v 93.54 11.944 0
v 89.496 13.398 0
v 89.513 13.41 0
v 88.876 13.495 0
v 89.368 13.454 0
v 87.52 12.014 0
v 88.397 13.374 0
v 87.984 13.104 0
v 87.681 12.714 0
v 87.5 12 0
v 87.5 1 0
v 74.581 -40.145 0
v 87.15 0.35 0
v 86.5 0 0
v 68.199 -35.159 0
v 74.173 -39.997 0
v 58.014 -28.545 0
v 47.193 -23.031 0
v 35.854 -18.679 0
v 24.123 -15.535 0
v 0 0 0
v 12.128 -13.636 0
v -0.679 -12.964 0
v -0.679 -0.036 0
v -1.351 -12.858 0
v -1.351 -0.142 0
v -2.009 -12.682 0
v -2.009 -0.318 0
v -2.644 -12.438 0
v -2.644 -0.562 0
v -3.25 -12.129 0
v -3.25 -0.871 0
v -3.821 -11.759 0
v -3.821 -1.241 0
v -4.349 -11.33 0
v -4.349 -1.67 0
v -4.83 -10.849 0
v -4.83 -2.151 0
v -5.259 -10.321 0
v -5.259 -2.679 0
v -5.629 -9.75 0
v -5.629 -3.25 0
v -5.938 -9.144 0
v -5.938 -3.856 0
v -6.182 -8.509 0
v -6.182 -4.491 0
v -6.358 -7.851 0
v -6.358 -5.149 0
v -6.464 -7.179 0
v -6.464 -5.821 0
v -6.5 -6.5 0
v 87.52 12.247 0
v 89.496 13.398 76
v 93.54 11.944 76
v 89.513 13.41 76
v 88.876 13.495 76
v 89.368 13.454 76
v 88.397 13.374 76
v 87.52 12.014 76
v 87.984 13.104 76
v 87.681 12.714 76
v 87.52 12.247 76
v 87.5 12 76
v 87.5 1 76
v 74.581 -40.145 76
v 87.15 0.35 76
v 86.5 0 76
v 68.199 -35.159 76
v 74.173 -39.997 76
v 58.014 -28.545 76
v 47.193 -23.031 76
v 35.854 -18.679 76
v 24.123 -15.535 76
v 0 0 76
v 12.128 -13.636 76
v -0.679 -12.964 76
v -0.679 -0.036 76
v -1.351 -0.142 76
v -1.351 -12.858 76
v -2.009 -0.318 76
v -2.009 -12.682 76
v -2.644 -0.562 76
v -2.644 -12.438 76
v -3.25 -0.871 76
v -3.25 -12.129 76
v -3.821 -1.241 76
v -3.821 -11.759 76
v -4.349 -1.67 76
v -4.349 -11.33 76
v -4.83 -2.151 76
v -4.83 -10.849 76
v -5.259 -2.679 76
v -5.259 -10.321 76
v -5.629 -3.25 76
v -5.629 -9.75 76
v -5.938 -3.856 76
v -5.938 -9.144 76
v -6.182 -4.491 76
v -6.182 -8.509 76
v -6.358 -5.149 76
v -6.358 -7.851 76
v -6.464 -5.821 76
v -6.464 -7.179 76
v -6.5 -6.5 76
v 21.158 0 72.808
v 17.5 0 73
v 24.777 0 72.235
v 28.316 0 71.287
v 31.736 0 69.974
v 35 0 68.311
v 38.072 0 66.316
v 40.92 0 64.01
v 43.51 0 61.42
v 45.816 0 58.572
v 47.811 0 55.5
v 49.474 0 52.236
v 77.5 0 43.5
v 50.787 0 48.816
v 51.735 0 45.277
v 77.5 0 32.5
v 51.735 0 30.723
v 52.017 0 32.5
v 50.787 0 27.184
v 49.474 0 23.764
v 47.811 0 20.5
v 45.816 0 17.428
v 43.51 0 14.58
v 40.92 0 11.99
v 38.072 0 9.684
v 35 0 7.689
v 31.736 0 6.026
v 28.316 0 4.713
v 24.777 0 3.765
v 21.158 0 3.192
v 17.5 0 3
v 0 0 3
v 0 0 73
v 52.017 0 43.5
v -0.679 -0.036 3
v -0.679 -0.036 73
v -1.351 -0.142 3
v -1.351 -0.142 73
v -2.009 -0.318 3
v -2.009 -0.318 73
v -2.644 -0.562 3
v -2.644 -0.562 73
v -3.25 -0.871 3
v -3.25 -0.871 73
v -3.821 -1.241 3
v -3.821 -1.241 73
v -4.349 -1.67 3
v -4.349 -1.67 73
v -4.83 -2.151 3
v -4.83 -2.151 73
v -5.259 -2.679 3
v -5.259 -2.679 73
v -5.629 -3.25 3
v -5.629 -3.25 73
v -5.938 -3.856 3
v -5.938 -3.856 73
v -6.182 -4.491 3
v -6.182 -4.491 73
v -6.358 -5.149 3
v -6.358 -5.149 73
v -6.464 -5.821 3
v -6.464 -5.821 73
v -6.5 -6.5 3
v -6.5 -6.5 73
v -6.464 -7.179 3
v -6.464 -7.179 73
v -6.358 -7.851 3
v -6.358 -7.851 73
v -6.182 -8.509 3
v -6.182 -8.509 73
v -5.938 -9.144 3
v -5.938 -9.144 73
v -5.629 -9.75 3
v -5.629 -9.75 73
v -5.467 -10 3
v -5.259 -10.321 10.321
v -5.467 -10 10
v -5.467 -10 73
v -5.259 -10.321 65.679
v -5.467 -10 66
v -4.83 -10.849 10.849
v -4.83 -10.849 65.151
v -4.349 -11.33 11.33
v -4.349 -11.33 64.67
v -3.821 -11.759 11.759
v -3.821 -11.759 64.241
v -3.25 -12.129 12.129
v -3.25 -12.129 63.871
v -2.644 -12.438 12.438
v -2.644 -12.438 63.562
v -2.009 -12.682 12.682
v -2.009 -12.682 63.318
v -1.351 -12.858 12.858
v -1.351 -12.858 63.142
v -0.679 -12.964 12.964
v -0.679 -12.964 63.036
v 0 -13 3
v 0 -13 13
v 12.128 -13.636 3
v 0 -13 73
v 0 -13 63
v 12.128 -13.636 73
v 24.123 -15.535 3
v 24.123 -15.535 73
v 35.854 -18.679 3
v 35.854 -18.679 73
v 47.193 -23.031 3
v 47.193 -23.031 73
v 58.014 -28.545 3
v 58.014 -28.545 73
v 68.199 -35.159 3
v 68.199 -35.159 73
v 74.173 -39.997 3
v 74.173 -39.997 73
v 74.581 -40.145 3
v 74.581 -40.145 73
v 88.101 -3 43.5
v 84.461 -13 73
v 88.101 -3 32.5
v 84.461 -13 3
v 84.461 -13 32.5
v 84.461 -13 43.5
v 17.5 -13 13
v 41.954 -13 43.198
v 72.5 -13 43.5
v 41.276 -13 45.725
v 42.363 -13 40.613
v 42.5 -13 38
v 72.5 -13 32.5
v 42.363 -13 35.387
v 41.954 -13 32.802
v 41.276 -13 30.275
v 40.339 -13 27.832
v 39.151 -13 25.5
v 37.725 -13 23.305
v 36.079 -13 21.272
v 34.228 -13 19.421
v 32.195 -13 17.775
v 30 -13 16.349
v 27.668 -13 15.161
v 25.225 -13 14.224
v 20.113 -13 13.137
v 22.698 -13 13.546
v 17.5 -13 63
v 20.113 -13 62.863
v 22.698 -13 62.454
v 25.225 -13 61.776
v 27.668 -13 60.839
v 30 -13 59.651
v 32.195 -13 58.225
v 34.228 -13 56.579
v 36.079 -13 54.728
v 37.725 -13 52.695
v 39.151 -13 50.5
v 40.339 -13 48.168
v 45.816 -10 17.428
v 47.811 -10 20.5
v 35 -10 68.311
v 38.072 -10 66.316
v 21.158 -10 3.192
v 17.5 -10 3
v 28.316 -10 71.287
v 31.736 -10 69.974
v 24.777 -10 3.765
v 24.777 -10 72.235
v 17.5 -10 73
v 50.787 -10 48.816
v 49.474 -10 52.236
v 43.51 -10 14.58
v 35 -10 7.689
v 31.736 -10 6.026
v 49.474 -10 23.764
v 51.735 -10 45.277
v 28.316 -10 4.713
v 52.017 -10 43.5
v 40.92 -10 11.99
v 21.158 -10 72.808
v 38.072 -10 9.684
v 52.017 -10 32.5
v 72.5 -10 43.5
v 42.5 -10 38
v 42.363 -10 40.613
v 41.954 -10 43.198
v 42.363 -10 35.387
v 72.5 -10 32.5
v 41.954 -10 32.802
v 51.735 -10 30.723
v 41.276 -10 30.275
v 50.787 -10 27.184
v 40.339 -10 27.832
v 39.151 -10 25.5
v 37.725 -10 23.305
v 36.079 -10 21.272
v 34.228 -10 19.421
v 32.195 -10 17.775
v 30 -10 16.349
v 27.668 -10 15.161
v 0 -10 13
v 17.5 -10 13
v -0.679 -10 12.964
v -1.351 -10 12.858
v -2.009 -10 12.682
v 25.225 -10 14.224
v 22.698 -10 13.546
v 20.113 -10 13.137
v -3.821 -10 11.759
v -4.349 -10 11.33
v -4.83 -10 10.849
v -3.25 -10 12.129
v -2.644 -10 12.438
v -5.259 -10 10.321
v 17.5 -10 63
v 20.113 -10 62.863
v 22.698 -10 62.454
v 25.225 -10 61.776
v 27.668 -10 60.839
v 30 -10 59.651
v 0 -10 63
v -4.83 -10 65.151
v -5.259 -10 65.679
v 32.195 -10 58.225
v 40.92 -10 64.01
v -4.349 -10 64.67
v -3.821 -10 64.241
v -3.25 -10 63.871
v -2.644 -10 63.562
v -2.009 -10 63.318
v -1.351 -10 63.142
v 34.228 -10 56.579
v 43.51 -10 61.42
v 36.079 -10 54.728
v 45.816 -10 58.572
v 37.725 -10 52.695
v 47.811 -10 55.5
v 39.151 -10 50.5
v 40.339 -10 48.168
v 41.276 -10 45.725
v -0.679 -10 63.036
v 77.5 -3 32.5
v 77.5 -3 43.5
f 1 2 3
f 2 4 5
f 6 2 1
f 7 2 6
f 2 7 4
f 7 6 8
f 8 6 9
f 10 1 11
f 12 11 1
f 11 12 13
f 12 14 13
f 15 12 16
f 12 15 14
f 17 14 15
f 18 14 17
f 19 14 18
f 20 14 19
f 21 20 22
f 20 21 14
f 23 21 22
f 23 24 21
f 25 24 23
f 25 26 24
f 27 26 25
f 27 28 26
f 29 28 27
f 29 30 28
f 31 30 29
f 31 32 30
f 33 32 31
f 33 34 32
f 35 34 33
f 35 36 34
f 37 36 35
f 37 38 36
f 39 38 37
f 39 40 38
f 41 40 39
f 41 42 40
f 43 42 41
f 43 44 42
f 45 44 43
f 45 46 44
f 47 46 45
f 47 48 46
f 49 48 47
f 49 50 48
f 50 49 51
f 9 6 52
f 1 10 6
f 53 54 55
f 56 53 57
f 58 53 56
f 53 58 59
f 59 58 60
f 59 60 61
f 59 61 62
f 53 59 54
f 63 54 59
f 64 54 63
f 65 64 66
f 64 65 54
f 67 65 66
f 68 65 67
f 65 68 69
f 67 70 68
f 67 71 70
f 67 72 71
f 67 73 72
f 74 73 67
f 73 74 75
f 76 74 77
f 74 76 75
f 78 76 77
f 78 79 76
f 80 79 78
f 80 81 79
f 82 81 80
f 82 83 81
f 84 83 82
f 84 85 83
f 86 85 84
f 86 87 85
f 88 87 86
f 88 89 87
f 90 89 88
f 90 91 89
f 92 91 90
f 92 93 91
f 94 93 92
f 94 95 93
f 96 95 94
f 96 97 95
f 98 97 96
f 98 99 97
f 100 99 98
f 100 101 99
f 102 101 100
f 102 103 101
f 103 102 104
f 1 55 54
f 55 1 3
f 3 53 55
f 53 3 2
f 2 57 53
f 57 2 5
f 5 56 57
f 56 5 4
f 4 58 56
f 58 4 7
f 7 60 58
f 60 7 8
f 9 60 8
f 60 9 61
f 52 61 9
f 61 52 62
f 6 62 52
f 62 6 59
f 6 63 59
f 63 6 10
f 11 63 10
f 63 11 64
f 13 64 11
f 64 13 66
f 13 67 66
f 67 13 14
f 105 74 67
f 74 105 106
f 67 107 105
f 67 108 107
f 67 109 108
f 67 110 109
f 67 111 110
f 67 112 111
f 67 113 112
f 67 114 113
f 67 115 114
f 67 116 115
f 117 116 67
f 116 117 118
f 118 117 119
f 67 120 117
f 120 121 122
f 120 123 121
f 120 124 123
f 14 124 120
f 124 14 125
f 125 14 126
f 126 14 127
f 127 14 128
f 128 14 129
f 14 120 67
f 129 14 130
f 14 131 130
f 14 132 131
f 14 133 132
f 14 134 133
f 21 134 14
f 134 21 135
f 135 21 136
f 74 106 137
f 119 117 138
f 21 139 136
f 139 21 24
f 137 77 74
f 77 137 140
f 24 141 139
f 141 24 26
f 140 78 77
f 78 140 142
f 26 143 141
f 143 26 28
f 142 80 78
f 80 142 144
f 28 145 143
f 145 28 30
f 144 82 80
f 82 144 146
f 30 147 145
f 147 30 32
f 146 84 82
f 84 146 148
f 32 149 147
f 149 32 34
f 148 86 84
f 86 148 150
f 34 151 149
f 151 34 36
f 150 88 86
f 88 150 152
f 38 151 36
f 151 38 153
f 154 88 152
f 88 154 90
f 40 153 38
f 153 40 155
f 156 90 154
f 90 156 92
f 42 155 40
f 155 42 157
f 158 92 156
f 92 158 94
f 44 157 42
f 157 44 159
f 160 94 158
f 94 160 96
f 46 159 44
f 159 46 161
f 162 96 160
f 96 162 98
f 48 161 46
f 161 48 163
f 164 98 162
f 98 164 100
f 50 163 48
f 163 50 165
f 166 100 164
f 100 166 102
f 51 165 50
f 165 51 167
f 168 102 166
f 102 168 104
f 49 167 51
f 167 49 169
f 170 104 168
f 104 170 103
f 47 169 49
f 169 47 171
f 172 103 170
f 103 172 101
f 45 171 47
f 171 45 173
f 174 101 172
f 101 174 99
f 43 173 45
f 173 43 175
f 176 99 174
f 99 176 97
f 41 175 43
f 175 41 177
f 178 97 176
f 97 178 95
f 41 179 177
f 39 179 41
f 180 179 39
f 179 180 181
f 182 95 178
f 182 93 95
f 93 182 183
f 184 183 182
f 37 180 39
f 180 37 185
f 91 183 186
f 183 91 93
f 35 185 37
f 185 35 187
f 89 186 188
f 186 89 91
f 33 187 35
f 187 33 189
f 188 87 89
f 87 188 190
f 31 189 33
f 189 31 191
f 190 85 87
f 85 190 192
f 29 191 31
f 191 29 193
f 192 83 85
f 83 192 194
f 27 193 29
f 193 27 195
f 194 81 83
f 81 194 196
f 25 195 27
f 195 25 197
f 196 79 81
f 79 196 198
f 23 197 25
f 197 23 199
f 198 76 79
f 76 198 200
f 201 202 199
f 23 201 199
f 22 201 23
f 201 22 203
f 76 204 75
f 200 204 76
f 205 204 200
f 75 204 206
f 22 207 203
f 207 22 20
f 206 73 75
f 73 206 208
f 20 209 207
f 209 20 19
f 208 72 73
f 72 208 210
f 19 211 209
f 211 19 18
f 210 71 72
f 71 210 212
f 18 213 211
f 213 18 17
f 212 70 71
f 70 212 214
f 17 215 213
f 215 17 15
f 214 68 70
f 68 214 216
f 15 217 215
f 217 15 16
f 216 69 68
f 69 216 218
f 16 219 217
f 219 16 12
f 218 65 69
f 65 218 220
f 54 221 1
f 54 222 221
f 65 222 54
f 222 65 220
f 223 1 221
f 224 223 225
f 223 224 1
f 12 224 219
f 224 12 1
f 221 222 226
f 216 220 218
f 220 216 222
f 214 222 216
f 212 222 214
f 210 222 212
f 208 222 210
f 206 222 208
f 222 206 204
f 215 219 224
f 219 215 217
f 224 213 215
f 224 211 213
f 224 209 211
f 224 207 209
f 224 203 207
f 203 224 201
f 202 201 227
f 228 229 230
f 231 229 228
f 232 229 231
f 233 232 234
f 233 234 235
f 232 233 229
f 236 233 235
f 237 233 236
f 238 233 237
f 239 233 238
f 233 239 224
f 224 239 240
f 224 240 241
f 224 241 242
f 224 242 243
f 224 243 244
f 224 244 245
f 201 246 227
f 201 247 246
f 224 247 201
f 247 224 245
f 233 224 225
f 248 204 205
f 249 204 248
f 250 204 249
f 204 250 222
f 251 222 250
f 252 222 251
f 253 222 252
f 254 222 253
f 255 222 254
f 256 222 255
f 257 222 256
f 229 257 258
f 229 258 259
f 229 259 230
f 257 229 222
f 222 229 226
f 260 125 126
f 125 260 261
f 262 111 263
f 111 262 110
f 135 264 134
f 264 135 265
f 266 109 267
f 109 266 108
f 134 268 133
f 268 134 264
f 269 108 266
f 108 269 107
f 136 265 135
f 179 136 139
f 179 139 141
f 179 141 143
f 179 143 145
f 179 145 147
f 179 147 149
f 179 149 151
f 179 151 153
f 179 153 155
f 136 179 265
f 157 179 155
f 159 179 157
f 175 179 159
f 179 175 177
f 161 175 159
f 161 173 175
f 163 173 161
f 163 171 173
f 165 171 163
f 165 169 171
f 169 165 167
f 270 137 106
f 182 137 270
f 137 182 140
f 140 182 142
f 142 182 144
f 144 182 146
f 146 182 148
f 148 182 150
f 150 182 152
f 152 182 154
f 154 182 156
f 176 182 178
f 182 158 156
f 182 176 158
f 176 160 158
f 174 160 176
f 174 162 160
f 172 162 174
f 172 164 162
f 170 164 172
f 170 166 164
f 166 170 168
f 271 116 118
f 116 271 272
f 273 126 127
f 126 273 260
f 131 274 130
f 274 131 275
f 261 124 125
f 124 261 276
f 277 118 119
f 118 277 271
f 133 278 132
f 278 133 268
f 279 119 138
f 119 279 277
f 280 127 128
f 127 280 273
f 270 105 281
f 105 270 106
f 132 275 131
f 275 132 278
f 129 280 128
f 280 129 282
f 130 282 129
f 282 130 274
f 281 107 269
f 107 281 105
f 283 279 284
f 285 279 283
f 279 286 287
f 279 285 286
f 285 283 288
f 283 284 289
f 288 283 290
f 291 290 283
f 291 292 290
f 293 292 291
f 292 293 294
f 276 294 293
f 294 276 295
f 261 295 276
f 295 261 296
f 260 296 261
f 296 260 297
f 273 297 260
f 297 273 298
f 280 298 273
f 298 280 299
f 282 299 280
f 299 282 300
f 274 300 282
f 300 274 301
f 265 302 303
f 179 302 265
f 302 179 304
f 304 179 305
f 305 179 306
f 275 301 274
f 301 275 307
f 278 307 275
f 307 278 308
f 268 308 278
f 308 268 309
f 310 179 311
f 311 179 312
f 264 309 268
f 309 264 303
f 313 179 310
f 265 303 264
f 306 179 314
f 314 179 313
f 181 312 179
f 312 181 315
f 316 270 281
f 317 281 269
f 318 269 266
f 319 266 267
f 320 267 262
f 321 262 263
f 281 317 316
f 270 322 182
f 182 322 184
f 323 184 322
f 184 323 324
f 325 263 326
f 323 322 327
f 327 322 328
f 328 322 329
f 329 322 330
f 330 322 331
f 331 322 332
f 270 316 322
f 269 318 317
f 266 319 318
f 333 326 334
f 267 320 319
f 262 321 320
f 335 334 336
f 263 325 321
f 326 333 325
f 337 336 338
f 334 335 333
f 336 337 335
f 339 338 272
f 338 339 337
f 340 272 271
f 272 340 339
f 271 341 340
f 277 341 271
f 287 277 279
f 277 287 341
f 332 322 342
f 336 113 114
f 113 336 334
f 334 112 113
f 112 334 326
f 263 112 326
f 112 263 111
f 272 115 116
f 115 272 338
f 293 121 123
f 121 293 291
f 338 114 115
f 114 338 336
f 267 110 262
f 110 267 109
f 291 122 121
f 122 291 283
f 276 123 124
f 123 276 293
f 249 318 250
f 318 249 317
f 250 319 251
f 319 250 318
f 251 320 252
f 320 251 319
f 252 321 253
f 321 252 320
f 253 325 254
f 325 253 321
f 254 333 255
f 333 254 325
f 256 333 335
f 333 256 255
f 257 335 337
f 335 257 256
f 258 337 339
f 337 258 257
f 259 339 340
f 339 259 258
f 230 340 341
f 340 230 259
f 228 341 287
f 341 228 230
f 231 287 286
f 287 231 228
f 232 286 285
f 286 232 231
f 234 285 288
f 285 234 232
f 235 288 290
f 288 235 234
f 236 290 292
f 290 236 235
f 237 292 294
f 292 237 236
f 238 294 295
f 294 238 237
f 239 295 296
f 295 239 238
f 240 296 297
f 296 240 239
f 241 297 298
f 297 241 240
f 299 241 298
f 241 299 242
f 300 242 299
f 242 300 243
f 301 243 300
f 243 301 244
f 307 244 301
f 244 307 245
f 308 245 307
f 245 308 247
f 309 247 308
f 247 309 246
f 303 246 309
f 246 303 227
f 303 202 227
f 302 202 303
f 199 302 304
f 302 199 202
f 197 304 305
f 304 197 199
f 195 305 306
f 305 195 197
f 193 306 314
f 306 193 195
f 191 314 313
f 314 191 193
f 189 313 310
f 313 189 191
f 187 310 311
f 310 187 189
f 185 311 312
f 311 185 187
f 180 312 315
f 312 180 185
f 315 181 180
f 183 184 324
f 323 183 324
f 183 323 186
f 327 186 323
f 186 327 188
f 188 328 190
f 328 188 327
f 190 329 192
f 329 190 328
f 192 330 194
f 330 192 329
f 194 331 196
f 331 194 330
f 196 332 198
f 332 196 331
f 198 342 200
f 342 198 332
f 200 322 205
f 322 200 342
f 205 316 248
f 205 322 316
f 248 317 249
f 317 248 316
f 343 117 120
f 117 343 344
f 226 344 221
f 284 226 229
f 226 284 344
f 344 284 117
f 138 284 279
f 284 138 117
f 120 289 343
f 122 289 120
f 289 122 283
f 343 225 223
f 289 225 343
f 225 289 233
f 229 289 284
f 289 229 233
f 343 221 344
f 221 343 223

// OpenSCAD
// Diameter of your wireless charger
QiDiameter = 70;
// Thickness of your wireless charger
QiThickness = 10;
// Width of the USB connector that you're using with the wireless charger. I would recommend giving an extra 1mm buffer over what you measured.
USBWidth = 11;
// We'll need this to position the wireless charger at the center of your phone.
PhoneHeight = 140;
// This determines the size of the base where the phone rest on. The default should be fine for most naked phones, but you may want to use a larger value if you have a thick casing.
PhoneThickness = 12;
// The default should be fine, but you can use a different value to have a thicker or thinner wall.
WallThickness = 3;
// The angle (in degrees) that the holder is tilted at.
Tilt = 70;

/* [Hidden] */
$fa = 6;
$fs = 0.5;


// Side Profile in 2D
module Side_Profile() {
 p2x = 0.25*QiDiameter + 0.5*PhoneHeight;
 p4x = p2x + WallThickness;
 p3x = p2x+1.5*cos(Tilt)+1.5;
 p3y = PhoneThickness+1.5*sin(Tilt);
 temp1 = (PhoneThickness-3*tan(Tilt))*cos(Tilt)+3;
 p5x = p3x + temp1*sin(Tilt);
 p5y = p3y - temp1*cos(Tilt);
 temp2 = sin(Tilt) * (p5x - (p5y + QiThickness + WallThickness) / tan(Tilt));
 p6x = temp2*sin(Tilt);
 p6y = -temp2*cos(Tilt) - QiThickness - WallThickness;
    
 difference() {
  union() {
   polygon([[0,0],
            [p2x - 1, 0],
            [p2x - 0.35, 0.35],  // Simple fillet
            [p2x, 1],
            [p2x, PhoneThickness], 
            [p3x, p3y],
            [p5x, p5y],
            [p6x, p6y],
            [0,-QiThickness - WallThickness]
           ]);
   translate([0,-0.5*(QiThickness+WallThickness),0]) circle(d=QiThickness+WallThickness);
   translate([p2x+1.5,PhoneThickness,0]) circle(d=3);
  }
  temp3 = 0.5 * temp2 / cos(Tilt);
  translate([0,-QiThickness - WallThickness - temp3,0]) circle(r=temp3);
 }
}

// Extruded and excess removed
module Extruded() {
 difference() {
  linear_extrude(height = QiDiameter + 2*WallThickness) Side_Profile();
  translate ([-100,-400-QiThickness-WallThickness,WallThickness]) resize([400,400,0]) cube(QiDiameter);
 }
}

// Qi Hole cut
module Qi_Hole() {
 difference() {
  Extruded();
  translate([0,-QiThickness,QiDiameter+WallThickness])
   rotate([-90,0,0])
    linear_extrude(height = 100)
     union() {
      polygon([[-100,0],
               [QiDiameter*0.25,0],
               [QiDiameter*0.25,QiDiameter],
               [-100,QiDiameter]
              ]);
      translate ([QiDiameter*0.25,QiDiameter/2,0]) circle(d=QiDiameter);
     }
  translate([0,-50,QiDiameter+WallThickness-QiThickness])
   rotate([-90,0,0])
    linear_extrude(height = 100)
     difference() {
      union() {
       polygon([[0,0],
                [QiDiameter*0.25,0],
                [QiDiameter*0.25,QiDiameter-2*QiThickness],
                [0,QiDiameter-2*QiThickness],
                [-QiThickness,QiDiameter-QiThickness],
                [-QiThickness,-QiThickness]
               ]);
       translate ([QiDiameter*0.25,(QiDiameter-2*QiThickness)/2,0]) circle(d=QiDiameter-2*QiThickness);
      }
      translate([0,-(QiThickness+WallThickness)/2,0]) circle(r=(QiThickness+WallThickness)/2);
      translate([0,QiDiameter-2*QiThickness+(QiThickness+WallThickness)/2,0]) circle(r=(QiThickness+WallThickness)/2);
     }
 }
}

  


// USB Hole cut
module USB_Hole() {
 difference() {
  Qi_Hole();
  translate([QiDiameter*0.75,-QiThickness/2,QiDiameter/2+WallThickness])
   resize([50,QiThickness,0])
    cube(USBWidth,center=true);
//  translate([QiDiameter*0.75+30+20,-QiThickness-WallThickness,QiDiameter/2+WallThickness])
  translate([PhoneHeight*0.5+QiDiameter*0.25+15,-QiThickness-WallThickness,QiDiameter/2+WallThickness])
   resize([60,QiThickness*2,0])
    cube(USBWidth,center=true);
 }
}

USB_Hole();
